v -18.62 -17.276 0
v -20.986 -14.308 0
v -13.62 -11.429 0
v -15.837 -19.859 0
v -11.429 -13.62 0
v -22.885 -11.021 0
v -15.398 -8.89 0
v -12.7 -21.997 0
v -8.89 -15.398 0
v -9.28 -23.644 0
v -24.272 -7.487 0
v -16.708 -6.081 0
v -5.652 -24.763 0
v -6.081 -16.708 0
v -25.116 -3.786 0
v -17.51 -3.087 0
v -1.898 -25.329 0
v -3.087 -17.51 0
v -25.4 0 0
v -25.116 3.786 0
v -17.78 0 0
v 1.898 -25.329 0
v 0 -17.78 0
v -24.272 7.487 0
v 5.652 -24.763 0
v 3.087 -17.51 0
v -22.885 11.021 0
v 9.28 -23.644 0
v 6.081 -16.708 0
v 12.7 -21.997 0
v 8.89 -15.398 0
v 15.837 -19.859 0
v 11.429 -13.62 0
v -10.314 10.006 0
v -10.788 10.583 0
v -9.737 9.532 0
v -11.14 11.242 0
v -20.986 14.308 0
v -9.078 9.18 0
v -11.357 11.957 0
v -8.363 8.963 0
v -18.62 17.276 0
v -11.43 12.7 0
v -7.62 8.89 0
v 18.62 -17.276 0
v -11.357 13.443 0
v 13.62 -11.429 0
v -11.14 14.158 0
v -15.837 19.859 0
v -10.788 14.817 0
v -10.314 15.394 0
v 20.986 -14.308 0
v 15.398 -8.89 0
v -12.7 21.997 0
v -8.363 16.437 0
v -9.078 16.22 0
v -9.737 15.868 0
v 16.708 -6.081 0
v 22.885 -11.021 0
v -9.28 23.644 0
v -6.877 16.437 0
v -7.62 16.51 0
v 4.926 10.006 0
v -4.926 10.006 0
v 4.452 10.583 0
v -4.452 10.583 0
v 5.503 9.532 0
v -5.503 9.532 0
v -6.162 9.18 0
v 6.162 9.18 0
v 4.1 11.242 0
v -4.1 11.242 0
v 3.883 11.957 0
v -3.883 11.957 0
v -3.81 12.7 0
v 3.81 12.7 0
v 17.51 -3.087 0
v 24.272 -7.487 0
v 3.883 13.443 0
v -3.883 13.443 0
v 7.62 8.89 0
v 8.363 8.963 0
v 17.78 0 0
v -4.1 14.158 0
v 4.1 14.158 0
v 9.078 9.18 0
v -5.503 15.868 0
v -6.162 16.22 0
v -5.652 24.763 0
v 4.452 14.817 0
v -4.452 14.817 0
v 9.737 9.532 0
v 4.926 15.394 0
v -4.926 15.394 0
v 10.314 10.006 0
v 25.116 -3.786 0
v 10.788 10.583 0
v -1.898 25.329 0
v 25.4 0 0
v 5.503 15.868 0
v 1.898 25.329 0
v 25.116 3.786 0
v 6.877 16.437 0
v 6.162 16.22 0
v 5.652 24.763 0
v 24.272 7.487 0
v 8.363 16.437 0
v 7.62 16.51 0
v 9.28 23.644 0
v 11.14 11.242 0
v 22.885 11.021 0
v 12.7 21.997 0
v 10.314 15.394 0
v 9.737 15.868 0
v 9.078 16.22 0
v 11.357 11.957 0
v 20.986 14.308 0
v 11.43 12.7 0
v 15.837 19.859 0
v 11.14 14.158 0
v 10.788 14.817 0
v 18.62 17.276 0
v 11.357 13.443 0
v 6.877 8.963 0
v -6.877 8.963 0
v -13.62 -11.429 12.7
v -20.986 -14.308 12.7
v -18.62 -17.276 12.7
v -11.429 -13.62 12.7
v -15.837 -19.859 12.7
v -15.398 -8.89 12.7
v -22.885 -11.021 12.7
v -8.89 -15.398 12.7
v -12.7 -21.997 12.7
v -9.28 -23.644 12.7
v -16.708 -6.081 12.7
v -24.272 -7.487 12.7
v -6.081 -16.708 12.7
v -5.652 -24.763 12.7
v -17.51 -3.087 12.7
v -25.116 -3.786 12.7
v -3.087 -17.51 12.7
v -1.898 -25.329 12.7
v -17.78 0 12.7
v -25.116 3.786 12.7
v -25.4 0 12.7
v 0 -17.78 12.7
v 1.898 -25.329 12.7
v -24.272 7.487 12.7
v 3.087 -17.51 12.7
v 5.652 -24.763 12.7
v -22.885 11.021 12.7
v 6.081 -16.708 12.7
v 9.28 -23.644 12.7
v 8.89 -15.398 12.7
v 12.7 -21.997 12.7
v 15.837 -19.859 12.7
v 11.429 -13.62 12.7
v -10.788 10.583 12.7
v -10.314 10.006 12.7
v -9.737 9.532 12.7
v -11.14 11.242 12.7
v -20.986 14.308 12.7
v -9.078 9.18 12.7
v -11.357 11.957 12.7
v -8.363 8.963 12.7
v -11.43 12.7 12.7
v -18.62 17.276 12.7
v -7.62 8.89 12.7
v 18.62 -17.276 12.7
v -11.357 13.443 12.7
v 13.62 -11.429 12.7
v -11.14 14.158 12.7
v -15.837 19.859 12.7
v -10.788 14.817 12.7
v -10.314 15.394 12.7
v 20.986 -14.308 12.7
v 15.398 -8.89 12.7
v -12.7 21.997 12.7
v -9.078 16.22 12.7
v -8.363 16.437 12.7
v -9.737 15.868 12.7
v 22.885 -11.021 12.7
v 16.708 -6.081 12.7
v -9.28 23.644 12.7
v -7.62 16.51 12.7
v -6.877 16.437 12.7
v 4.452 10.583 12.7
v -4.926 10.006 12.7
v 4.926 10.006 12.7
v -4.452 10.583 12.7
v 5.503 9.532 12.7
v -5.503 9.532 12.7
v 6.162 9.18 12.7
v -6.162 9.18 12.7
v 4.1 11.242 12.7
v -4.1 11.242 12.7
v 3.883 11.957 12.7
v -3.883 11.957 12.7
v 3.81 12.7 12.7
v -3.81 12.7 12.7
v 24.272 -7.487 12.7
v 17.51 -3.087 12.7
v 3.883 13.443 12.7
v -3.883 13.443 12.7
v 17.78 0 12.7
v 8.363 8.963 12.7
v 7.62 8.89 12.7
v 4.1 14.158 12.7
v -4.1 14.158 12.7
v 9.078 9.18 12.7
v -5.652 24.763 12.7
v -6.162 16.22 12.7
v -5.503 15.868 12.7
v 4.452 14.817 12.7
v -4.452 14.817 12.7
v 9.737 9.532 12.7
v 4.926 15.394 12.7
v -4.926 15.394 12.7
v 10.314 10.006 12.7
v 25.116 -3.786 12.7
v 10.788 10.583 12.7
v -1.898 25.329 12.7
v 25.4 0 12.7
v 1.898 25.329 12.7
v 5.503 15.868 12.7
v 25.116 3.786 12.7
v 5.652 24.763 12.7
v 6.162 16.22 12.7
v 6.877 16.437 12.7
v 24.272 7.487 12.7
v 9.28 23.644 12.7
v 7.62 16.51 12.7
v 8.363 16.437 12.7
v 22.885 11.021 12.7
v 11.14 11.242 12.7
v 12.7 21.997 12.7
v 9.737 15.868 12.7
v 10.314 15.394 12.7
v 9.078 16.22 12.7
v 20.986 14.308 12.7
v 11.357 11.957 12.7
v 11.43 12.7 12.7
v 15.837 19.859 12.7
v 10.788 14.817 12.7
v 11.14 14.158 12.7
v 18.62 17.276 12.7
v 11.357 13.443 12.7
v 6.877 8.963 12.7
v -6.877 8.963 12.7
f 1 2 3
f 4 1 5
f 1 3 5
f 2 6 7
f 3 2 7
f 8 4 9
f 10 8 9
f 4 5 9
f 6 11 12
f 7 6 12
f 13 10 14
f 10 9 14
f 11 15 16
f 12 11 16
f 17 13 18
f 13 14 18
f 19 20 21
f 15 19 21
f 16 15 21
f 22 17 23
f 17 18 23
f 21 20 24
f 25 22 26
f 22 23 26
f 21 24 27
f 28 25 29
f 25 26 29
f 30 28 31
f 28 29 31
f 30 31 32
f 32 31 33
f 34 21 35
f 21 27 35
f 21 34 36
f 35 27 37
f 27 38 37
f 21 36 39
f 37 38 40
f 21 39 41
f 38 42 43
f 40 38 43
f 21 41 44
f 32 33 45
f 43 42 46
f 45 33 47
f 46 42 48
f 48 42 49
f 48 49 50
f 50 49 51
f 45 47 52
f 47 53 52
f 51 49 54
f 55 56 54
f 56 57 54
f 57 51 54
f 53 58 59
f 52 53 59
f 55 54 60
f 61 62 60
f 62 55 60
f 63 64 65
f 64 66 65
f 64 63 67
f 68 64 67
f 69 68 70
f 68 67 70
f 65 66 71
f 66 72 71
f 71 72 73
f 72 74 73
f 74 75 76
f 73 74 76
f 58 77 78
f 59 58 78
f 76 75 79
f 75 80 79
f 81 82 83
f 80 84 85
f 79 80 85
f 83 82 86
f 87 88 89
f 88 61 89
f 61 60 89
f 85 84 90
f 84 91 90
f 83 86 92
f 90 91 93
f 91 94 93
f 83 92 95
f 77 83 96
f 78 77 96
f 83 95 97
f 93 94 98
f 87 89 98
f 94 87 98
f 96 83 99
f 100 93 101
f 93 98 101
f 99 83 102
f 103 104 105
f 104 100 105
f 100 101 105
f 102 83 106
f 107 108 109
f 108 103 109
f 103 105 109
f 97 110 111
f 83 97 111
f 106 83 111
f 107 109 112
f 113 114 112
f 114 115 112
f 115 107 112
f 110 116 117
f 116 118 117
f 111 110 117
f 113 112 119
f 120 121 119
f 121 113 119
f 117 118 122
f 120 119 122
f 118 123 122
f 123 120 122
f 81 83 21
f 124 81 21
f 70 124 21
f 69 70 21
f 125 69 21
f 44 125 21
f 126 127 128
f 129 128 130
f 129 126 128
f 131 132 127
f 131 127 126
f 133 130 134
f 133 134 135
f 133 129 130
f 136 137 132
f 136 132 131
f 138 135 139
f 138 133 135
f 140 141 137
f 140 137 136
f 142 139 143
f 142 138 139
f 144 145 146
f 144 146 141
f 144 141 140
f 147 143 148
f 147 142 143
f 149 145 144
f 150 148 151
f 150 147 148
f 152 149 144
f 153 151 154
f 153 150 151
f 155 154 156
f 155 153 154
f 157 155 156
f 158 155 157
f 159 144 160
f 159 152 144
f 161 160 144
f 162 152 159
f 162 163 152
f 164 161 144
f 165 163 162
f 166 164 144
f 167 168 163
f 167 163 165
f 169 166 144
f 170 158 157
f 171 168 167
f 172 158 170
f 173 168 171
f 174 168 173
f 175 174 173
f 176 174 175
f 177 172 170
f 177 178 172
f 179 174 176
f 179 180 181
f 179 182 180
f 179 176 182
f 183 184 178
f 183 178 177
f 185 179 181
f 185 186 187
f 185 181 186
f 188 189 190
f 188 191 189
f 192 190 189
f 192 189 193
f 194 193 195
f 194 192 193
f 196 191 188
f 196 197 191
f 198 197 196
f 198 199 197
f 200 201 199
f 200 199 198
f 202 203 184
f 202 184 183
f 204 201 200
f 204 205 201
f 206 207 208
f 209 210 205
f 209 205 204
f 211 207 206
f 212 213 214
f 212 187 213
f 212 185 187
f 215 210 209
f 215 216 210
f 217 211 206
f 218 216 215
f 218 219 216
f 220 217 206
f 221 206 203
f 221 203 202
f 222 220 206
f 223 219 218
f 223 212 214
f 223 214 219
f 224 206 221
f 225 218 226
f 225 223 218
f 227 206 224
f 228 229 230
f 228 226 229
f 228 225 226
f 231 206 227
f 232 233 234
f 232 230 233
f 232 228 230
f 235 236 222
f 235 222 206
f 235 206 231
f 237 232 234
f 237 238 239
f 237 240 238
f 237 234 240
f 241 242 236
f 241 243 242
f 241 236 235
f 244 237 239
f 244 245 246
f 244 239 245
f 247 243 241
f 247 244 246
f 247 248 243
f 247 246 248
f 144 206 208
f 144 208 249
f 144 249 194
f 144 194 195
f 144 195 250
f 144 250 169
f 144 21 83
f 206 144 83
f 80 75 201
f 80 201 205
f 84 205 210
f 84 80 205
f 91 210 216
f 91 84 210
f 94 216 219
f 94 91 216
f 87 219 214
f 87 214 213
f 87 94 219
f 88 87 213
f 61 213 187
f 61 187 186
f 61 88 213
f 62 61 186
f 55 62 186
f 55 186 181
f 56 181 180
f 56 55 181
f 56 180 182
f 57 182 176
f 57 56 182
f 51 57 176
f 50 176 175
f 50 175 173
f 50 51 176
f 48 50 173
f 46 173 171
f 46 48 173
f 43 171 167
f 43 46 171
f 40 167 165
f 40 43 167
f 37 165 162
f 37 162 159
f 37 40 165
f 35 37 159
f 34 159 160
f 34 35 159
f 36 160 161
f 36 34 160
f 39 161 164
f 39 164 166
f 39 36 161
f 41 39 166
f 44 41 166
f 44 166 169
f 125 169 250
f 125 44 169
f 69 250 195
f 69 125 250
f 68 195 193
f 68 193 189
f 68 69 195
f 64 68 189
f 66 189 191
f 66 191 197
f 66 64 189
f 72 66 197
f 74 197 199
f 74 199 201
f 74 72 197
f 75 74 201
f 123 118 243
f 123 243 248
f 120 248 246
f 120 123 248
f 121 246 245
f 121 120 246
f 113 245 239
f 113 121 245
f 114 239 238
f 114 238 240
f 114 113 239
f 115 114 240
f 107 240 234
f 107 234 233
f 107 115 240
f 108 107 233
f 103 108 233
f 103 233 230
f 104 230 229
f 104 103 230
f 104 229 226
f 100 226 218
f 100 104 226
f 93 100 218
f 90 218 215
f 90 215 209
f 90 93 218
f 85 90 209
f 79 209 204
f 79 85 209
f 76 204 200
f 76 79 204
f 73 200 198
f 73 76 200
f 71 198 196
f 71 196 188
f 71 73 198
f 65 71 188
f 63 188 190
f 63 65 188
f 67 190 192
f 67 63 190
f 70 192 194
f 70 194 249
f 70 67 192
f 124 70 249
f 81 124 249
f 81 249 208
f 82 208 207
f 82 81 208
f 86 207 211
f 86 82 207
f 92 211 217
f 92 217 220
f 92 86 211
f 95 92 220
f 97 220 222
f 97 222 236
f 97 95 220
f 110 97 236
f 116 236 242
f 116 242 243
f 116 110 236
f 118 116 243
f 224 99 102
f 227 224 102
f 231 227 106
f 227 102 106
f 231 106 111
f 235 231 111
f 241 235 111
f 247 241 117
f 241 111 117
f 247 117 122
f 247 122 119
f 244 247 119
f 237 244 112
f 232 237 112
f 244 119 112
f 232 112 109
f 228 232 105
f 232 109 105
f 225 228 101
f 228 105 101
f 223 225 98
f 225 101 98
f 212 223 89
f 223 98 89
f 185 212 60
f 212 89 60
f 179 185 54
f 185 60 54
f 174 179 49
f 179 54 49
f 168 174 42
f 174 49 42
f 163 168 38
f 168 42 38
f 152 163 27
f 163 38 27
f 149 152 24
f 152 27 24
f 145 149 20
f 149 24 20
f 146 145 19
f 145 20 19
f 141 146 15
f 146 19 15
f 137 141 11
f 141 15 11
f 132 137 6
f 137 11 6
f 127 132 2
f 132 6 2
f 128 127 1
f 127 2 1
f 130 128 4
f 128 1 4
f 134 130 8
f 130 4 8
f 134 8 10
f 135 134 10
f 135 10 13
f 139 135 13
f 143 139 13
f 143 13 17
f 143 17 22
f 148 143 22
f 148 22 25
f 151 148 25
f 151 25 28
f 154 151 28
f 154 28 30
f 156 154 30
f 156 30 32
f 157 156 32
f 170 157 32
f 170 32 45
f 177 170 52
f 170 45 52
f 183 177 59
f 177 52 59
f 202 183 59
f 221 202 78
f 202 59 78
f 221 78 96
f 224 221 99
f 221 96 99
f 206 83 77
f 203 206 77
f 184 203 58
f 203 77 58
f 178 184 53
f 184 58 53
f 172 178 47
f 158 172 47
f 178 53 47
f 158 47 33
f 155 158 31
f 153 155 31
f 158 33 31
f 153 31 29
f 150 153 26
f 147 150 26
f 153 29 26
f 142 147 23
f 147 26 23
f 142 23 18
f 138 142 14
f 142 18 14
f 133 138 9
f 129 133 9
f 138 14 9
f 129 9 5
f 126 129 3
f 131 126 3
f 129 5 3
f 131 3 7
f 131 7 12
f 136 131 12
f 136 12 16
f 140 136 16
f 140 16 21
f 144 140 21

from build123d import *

# Parameters (mm, degrees)
F0_R     = 25.4
F0_R_2   = 3.81
F1_DEPTH = 12.7


with BuildPart() as f1:
    # F0 (on Top) → F1 (new body)
    with BuildSketch(Plane.XY):
        Circle(F0_R)
        with BuildLine():
            Line((-17.78, 0), (17.78, 0))
            ThreePointArc((17.78, 0), (0, -17.78), (-17.78, 0))
        make_face(mode=Mode.SUBTRACT)
        with Locations((-7.62, 12.7)):
            Circle(F0_R_2, mode=Mode.SUBTRACT)
        with Locations((7.62, 12.7)):
            Circle(F0_R_2, mode=Mode.SUBTRACT)
    extrude(amount=F1_DEPTH)


solid = f1.part
